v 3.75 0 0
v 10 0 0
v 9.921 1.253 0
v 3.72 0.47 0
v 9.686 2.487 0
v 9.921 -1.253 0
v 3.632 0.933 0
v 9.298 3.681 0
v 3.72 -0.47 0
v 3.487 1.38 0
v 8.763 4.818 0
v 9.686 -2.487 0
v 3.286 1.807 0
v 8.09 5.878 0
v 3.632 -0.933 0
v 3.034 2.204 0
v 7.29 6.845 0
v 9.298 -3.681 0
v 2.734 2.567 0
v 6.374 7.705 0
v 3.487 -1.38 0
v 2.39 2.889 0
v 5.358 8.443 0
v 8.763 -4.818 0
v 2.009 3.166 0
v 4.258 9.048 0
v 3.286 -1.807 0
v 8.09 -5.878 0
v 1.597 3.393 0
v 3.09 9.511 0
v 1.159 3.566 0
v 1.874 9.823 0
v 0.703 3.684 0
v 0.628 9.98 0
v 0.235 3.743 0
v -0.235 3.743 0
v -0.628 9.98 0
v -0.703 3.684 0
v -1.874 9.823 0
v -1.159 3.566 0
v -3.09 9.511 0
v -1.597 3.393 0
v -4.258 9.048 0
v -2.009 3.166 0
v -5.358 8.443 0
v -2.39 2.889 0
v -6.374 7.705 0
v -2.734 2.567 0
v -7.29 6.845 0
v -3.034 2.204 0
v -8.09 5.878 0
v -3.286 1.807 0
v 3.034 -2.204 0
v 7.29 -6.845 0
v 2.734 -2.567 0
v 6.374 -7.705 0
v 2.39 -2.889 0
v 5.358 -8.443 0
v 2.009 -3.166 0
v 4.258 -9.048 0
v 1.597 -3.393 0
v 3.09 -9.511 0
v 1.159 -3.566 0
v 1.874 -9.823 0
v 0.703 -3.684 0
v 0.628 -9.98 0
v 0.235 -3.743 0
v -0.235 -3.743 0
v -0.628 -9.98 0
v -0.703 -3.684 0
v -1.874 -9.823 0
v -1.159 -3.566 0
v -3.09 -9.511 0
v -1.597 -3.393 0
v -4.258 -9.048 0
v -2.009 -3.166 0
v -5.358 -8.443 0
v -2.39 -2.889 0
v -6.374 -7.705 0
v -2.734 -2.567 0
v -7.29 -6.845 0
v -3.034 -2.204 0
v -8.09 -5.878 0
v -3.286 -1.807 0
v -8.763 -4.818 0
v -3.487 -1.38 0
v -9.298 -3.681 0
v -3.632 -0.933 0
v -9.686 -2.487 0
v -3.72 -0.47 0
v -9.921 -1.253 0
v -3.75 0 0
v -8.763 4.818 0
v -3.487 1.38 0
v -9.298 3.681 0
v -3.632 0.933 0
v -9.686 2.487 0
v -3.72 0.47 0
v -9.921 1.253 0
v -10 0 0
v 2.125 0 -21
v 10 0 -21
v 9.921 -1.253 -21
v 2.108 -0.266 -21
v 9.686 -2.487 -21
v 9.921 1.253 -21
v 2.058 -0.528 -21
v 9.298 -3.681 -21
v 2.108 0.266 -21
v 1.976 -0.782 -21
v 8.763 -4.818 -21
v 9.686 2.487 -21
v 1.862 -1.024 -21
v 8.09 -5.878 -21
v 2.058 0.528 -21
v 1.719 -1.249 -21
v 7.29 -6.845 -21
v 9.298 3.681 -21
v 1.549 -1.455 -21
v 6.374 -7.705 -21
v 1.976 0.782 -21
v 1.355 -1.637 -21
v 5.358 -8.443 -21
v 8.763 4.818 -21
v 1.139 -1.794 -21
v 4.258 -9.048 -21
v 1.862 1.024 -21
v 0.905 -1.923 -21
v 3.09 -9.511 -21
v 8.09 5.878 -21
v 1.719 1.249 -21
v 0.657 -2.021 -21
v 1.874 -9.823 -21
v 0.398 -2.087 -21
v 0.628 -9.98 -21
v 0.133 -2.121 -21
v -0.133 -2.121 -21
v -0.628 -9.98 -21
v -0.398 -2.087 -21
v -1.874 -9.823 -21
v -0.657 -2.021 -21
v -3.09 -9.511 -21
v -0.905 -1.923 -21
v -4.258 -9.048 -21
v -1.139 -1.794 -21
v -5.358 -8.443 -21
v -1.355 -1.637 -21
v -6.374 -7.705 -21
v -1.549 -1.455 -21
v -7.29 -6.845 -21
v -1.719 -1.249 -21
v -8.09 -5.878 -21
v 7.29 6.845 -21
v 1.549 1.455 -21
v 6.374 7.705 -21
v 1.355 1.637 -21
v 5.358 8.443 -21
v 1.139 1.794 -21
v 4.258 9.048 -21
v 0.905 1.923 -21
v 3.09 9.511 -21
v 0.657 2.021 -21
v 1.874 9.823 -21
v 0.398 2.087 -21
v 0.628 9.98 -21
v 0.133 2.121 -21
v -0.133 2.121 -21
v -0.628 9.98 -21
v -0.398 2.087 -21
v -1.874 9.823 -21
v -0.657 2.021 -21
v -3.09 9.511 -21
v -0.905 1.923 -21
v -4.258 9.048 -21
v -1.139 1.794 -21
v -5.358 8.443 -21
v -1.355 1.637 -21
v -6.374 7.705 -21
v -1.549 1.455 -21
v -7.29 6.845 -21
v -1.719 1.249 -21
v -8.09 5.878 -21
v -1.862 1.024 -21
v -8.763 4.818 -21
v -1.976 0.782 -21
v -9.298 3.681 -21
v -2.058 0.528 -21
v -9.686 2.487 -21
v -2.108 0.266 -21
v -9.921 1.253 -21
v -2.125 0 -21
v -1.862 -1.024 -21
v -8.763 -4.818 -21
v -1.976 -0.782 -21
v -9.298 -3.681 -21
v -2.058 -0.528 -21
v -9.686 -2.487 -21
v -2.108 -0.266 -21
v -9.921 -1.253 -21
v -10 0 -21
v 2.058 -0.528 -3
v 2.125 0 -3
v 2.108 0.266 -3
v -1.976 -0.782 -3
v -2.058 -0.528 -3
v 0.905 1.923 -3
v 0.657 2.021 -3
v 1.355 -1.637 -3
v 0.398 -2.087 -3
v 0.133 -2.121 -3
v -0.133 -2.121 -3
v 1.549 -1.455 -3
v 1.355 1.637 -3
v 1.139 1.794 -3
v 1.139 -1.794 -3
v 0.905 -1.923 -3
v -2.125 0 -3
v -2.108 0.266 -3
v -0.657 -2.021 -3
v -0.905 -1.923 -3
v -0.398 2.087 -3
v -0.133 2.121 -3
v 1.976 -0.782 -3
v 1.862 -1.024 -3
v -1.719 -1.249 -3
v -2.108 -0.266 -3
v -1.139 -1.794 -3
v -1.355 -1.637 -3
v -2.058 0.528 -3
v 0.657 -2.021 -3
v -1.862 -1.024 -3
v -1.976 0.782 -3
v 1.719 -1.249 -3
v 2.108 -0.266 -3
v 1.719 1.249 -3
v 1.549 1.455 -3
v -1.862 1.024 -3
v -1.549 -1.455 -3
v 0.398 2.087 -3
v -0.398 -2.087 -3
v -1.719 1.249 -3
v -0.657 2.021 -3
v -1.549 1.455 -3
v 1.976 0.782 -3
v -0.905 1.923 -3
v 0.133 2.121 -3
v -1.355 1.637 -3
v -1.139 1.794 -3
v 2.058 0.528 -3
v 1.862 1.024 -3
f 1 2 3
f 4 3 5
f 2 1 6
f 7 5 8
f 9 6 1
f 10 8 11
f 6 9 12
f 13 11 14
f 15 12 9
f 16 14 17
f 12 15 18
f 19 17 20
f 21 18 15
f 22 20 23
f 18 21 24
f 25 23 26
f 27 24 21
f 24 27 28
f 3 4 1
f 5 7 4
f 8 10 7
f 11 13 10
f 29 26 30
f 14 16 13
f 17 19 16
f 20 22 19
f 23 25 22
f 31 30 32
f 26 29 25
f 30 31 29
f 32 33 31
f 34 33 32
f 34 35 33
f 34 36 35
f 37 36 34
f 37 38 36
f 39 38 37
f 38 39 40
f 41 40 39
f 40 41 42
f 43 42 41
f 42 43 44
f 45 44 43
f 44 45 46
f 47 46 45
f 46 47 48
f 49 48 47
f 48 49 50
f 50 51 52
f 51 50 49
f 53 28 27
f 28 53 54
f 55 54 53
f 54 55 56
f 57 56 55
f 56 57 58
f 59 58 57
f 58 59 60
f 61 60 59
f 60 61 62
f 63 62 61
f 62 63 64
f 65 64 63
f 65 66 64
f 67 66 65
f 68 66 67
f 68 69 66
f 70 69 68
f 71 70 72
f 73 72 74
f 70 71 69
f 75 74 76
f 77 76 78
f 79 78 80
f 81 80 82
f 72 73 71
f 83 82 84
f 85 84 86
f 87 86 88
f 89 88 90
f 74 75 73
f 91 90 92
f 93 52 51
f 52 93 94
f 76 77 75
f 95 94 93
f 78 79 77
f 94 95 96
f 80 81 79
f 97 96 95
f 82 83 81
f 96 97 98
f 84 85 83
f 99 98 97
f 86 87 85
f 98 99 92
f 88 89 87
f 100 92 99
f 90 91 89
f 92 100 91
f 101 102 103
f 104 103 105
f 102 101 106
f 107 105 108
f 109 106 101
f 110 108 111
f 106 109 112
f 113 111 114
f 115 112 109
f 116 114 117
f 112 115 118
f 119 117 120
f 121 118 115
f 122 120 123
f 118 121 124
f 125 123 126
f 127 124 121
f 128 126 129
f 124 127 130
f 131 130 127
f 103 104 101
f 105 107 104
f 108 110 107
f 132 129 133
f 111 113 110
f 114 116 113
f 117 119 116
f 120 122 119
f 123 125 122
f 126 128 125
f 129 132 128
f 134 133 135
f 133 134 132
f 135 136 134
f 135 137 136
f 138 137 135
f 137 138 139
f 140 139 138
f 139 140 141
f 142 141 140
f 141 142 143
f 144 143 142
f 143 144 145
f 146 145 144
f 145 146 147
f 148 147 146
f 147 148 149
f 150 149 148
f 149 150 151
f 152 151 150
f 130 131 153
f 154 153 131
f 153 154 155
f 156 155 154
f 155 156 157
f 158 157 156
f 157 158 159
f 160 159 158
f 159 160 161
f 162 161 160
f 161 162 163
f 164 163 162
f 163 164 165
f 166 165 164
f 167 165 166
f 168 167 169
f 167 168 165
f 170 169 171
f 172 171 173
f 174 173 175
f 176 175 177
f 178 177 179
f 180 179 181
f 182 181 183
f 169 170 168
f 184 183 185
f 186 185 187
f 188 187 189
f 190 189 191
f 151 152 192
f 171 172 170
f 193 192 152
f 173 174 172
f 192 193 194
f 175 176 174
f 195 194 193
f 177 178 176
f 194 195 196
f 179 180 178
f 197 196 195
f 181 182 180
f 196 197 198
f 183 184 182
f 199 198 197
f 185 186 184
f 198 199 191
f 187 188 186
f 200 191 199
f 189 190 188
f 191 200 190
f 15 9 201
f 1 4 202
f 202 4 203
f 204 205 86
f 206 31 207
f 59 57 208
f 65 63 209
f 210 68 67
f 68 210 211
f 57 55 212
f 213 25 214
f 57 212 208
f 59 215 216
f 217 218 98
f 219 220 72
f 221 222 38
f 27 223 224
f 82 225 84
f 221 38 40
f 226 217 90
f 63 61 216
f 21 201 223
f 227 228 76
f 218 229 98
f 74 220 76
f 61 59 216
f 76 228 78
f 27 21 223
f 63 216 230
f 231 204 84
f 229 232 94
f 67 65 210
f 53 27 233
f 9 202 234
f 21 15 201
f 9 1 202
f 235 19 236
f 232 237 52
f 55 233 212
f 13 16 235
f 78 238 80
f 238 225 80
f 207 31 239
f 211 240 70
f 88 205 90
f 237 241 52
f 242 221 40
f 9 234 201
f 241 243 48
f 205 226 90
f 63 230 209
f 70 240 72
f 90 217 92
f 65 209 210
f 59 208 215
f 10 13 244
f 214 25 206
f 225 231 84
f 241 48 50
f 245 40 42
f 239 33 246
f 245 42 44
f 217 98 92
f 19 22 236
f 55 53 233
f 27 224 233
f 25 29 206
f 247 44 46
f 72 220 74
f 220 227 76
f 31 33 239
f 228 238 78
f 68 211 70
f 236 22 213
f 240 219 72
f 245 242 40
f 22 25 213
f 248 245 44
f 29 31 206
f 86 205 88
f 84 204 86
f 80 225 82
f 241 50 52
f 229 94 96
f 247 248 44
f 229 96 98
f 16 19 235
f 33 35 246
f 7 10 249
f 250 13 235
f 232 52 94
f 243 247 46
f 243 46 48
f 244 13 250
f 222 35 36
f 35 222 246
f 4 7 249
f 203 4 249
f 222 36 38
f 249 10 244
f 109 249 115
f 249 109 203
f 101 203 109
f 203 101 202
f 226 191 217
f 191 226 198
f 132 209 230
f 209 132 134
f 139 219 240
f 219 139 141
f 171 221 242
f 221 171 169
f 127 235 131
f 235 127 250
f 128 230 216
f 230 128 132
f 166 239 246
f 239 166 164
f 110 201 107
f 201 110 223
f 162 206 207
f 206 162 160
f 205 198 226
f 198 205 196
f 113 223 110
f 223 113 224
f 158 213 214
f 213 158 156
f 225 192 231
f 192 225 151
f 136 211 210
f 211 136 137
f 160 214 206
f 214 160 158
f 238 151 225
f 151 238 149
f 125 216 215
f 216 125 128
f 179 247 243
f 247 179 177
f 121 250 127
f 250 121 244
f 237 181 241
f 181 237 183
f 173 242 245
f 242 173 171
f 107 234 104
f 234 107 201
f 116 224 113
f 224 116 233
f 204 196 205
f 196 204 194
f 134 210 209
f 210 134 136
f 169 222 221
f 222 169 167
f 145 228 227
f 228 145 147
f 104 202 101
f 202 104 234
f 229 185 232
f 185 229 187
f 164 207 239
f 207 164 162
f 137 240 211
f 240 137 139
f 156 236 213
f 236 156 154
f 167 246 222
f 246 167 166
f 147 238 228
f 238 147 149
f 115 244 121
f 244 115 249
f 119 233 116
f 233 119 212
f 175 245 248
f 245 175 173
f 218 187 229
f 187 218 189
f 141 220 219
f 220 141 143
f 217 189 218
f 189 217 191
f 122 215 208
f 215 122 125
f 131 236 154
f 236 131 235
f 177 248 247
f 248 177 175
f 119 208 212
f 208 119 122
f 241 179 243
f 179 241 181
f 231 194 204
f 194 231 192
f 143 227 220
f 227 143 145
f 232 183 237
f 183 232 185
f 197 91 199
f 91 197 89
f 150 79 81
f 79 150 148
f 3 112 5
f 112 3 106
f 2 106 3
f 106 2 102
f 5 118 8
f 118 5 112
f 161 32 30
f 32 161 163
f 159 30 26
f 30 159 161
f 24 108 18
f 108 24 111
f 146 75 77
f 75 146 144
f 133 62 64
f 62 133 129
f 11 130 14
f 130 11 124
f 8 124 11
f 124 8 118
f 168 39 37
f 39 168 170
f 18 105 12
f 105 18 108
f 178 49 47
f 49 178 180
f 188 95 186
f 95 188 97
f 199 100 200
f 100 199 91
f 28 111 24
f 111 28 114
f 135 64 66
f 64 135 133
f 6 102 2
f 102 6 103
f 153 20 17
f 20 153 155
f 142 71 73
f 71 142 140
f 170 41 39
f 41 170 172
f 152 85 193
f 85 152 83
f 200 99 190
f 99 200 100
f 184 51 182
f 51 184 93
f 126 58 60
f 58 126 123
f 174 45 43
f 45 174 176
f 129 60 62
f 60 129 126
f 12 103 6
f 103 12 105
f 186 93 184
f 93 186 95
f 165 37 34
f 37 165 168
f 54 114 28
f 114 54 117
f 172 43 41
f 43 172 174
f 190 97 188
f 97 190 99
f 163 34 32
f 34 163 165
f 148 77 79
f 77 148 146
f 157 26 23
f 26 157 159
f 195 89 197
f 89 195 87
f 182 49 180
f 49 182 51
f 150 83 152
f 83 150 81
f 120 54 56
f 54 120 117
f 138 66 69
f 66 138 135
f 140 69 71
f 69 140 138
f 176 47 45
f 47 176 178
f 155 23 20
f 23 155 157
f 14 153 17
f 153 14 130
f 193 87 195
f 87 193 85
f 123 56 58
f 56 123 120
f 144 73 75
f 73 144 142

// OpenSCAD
$fn = 50;


difference() {
	union() {
		translate(v = [0, 0, -21.0000000000]) {
			cylinder(h = 21, r = 10.0000000000);
		}
		cylinder(h = 0, r = 20.0000000000);
	}
	union() {
		translate(v = [0, 0, 0]) {
			rotate(a = [0, 0, 0]) {
				difference() {
					union() {
						#translate(v = [0, 0, -21.0000000000]) {
							cylinder(h = 21, r = 2.0000000000);
						}
						#translate(v = [0, 0, -3]) {
							cylinder(h = 3, r = 10.0000000000, r1 = 2.1250000000, r2 = 3.7500000000);
						}
						#translate(v = [0, 0, -21.0000000000]) {
							cylinder(h = 21, r = 2.1250000000);
						}
						#translate(v = [0, 0, -21.0000000000]) {
							cylinder(h = 21, r = 2.0000000000);
						}
					}
					union();
				}
			}
		}
	}
}
